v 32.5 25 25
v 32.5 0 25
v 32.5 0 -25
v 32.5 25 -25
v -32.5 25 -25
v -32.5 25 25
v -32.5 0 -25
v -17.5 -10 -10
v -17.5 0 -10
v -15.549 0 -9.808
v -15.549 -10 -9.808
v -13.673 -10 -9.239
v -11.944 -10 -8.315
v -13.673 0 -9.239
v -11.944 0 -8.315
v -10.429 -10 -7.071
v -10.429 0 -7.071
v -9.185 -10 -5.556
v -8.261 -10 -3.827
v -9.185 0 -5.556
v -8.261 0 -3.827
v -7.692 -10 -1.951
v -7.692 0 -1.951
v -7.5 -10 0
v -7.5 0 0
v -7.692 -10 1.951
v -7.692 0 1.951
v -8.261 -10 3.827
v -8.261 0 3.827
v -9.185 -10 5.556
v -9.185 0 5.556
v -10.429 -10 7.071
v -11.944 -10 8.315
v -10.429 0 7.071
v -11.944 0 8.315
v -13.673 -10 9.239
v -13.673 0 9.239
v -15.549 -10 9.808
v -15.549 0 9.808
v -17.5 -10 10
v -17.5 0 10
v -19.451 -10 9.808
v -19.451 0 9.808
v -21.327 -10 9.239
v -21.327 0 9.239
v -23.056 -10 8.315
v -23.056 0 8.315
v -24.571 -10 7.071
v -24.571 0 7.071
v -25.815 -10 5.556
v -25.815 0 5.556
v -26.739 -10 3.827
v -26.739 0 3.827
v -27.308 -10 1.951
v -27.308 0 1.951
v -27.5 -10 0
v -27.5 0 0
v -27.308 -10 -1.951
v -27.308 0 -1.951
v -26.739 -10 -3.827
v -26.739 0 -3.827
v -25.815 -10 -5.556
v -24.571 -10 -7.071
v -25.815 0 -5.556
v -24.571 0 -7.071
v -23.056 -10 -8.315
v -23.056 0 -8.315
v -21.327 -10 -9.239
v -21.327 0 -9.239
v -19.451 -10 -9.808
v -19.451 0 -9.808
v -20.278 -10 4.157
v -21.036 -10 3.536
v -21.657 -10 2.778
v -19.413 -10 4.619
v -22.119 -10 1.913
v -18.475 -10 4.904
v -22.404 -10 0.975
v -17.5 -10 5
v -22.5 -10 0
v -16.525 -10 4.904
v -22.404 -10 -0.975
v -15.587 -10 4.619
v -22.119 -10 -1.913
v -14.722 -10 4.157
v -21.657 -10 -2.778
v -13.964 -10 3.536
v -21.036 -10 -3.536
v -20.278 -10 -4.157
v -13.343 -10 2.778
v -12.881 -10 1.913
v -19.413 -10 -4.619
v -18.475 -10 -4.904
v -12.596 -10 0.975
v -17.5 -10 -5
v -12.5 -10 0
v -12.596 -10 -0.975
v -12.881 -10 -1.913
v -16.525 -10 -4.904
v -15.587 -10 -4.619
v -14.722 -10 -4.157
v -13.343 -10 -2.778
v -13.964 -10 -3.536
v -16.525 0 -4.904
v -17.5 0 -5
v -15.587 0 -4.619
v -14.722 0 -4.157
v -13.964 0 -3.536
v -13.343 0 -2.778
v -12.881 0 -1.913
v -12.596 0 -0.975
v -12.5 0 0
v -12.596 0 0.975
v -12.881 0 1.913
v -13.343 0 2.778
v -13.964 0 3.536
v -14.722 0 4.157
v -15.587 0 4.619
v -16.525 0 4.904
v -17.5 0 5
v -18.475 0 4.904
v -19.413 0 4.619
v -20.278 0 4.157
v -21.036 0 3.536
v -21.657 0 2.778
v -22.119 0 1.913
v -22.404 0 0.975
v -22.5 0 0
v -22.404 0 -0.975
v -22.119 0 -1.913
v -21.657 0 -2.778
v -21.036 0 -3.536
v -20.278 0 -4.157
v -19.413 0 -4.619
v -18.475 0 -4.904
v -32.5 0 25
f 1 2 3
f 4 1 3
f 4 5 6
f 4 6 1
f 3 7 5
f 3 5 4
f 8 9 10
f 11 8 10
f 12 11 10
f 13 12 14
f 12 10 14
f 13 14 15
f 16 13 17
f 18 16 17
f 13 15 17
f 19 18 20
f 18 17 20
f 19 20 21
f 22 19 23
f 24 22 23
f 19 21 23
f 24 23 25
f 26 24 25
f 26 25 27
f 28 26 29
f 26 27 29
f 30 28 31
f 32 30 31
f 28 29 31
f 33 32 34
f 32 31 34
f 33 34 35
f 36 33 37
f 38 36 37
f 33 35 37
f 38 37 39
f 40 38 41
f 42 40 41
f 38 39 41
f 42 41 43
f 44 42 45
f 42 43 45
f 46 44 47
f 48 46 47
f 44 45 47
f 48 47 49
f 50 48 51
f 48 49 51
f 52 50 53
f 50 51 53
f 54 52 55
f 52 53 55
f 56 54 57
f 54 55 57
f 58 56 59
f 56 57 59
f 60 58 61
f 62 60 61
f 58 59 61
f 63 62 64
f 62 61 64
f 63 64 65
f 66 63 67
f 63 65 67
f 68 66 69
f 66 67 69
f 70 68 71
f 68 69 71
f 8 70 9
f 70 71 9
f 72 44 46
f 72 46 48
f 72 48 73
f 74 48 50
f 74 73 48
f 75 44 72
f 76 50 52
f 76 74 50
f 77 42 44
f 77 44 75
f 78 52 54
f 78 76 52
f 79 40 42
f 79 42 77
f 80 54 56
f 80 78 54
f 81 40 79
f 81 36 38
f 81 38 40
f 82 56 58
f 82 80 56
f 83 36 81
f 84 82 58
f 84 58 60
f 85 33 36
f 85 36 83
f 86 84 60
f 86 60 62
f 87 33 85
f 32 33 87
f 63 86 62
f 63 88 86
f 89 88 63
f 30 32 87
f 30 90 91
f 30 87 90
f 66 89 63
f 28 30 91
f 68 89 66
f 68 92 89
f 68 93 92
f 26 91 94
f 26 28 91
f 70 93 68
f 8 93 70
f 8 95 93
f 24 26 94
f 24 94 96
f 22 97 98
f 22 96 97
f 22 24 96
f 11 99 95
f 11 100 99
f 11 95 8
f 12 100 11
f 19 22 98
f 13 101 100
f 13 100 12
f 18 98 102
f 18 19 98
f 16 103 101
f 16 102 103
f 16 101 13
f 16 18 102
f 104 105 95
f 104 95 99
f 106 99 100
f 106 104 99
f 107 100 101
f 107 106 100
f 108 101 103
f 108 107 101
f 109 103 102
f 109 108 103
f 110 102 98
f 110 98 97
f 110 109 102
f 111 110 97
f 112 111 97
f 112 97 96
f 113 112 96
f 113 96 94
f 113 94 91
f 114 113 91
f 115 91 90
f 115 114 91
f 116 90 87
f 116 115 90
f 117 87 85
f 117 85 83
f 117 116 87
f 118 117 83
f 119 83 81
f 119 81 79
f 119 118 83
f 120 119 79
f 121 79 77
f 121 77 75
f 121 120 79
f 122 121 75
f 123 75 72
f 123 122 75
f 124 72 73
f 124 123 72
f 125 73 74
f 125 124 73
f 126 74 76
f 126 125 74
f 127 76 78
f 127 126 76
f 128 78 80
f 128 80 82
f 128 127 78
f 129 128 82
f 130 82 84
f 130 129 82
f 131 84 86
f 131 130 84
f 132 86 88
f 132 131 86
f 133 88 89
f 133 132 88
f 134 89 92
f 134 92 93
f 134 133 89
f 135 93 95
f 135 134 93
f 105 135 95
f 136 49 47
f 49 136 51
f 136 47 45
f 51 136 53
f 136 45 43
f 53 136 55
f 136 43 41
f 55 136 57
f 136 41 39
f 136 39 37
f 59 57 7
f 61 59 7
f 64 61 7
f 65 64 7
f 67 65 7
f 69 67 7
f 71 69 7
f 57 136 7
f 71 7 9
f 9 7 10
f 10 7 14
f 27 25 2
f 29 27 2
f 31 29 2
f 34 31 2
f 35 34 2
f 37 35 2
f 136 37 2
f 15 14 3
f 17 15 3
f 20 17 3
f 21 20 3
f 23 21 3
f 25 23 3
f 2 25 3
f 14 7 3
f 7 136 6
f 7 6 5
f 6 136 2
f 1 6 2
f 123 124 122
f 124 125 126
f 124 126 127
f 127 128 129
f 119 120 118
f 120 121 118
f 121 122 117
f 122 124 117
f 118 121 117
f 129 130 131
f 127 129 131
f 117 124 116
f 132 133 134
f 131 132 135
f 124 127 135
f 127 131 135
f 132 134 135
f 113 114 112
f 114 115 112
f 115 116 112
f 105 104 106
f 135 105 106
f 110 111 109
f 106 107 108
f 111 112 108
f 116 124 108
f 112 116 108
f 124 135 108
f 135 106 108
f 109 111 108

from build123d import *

# Parameters (mm, degrees)
SKETCH1_W           = 65
SKETCH1_H           = 50
BOSS_EXTRUDE1_DEPTH = 25
SKETCH2_R           = 10
SKETCH2_R_2         = 5
BOSS_EXTRUDE2_DEPTH = 10


with BuildPart() as part:
    # Sketch1 → Boss-Extrude1 (new body)
    with BuildSketch(Plane(origin=(0, 0, 0), x_dir=(1, 0, 0), z_dir=(0, 1, 0))):
        Rectangle(SKETCH1_W, SKETCH1_H)
    extrude(amount=BOSS_EXTRUDE1_DEPTH)

    # Sketch2 → Boss-Extrude2 (add)
    with BuildSketch(Plane.XZ):
        with Locations(Location((-17.5, 0, 0), (0, 0, 270))):
            Circle(SKETCH2_R)
        with Locations(Location((-17.5, 0, 0), (0, 0, 270))):
            Circle(SKETCH2_R_2, mode=Mode.SUBTRACT)
    extrude(amount=BOSS_EXTRUDE2_DEPTH)


solid = part.part
